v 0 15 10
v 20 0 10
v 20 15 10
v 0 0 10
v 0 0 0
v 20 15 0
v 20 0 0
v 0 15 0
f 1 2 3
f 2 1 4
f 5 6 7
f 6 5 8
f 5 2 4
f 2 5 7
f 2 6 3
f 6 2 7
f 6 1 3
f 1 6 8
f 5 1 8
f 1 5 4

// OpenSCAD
// Solid block 20 x 15 x 10 mm; assumption: one corner at the origin, extending into +X, +Y, +Z.
cube([20, 15, 10]);
